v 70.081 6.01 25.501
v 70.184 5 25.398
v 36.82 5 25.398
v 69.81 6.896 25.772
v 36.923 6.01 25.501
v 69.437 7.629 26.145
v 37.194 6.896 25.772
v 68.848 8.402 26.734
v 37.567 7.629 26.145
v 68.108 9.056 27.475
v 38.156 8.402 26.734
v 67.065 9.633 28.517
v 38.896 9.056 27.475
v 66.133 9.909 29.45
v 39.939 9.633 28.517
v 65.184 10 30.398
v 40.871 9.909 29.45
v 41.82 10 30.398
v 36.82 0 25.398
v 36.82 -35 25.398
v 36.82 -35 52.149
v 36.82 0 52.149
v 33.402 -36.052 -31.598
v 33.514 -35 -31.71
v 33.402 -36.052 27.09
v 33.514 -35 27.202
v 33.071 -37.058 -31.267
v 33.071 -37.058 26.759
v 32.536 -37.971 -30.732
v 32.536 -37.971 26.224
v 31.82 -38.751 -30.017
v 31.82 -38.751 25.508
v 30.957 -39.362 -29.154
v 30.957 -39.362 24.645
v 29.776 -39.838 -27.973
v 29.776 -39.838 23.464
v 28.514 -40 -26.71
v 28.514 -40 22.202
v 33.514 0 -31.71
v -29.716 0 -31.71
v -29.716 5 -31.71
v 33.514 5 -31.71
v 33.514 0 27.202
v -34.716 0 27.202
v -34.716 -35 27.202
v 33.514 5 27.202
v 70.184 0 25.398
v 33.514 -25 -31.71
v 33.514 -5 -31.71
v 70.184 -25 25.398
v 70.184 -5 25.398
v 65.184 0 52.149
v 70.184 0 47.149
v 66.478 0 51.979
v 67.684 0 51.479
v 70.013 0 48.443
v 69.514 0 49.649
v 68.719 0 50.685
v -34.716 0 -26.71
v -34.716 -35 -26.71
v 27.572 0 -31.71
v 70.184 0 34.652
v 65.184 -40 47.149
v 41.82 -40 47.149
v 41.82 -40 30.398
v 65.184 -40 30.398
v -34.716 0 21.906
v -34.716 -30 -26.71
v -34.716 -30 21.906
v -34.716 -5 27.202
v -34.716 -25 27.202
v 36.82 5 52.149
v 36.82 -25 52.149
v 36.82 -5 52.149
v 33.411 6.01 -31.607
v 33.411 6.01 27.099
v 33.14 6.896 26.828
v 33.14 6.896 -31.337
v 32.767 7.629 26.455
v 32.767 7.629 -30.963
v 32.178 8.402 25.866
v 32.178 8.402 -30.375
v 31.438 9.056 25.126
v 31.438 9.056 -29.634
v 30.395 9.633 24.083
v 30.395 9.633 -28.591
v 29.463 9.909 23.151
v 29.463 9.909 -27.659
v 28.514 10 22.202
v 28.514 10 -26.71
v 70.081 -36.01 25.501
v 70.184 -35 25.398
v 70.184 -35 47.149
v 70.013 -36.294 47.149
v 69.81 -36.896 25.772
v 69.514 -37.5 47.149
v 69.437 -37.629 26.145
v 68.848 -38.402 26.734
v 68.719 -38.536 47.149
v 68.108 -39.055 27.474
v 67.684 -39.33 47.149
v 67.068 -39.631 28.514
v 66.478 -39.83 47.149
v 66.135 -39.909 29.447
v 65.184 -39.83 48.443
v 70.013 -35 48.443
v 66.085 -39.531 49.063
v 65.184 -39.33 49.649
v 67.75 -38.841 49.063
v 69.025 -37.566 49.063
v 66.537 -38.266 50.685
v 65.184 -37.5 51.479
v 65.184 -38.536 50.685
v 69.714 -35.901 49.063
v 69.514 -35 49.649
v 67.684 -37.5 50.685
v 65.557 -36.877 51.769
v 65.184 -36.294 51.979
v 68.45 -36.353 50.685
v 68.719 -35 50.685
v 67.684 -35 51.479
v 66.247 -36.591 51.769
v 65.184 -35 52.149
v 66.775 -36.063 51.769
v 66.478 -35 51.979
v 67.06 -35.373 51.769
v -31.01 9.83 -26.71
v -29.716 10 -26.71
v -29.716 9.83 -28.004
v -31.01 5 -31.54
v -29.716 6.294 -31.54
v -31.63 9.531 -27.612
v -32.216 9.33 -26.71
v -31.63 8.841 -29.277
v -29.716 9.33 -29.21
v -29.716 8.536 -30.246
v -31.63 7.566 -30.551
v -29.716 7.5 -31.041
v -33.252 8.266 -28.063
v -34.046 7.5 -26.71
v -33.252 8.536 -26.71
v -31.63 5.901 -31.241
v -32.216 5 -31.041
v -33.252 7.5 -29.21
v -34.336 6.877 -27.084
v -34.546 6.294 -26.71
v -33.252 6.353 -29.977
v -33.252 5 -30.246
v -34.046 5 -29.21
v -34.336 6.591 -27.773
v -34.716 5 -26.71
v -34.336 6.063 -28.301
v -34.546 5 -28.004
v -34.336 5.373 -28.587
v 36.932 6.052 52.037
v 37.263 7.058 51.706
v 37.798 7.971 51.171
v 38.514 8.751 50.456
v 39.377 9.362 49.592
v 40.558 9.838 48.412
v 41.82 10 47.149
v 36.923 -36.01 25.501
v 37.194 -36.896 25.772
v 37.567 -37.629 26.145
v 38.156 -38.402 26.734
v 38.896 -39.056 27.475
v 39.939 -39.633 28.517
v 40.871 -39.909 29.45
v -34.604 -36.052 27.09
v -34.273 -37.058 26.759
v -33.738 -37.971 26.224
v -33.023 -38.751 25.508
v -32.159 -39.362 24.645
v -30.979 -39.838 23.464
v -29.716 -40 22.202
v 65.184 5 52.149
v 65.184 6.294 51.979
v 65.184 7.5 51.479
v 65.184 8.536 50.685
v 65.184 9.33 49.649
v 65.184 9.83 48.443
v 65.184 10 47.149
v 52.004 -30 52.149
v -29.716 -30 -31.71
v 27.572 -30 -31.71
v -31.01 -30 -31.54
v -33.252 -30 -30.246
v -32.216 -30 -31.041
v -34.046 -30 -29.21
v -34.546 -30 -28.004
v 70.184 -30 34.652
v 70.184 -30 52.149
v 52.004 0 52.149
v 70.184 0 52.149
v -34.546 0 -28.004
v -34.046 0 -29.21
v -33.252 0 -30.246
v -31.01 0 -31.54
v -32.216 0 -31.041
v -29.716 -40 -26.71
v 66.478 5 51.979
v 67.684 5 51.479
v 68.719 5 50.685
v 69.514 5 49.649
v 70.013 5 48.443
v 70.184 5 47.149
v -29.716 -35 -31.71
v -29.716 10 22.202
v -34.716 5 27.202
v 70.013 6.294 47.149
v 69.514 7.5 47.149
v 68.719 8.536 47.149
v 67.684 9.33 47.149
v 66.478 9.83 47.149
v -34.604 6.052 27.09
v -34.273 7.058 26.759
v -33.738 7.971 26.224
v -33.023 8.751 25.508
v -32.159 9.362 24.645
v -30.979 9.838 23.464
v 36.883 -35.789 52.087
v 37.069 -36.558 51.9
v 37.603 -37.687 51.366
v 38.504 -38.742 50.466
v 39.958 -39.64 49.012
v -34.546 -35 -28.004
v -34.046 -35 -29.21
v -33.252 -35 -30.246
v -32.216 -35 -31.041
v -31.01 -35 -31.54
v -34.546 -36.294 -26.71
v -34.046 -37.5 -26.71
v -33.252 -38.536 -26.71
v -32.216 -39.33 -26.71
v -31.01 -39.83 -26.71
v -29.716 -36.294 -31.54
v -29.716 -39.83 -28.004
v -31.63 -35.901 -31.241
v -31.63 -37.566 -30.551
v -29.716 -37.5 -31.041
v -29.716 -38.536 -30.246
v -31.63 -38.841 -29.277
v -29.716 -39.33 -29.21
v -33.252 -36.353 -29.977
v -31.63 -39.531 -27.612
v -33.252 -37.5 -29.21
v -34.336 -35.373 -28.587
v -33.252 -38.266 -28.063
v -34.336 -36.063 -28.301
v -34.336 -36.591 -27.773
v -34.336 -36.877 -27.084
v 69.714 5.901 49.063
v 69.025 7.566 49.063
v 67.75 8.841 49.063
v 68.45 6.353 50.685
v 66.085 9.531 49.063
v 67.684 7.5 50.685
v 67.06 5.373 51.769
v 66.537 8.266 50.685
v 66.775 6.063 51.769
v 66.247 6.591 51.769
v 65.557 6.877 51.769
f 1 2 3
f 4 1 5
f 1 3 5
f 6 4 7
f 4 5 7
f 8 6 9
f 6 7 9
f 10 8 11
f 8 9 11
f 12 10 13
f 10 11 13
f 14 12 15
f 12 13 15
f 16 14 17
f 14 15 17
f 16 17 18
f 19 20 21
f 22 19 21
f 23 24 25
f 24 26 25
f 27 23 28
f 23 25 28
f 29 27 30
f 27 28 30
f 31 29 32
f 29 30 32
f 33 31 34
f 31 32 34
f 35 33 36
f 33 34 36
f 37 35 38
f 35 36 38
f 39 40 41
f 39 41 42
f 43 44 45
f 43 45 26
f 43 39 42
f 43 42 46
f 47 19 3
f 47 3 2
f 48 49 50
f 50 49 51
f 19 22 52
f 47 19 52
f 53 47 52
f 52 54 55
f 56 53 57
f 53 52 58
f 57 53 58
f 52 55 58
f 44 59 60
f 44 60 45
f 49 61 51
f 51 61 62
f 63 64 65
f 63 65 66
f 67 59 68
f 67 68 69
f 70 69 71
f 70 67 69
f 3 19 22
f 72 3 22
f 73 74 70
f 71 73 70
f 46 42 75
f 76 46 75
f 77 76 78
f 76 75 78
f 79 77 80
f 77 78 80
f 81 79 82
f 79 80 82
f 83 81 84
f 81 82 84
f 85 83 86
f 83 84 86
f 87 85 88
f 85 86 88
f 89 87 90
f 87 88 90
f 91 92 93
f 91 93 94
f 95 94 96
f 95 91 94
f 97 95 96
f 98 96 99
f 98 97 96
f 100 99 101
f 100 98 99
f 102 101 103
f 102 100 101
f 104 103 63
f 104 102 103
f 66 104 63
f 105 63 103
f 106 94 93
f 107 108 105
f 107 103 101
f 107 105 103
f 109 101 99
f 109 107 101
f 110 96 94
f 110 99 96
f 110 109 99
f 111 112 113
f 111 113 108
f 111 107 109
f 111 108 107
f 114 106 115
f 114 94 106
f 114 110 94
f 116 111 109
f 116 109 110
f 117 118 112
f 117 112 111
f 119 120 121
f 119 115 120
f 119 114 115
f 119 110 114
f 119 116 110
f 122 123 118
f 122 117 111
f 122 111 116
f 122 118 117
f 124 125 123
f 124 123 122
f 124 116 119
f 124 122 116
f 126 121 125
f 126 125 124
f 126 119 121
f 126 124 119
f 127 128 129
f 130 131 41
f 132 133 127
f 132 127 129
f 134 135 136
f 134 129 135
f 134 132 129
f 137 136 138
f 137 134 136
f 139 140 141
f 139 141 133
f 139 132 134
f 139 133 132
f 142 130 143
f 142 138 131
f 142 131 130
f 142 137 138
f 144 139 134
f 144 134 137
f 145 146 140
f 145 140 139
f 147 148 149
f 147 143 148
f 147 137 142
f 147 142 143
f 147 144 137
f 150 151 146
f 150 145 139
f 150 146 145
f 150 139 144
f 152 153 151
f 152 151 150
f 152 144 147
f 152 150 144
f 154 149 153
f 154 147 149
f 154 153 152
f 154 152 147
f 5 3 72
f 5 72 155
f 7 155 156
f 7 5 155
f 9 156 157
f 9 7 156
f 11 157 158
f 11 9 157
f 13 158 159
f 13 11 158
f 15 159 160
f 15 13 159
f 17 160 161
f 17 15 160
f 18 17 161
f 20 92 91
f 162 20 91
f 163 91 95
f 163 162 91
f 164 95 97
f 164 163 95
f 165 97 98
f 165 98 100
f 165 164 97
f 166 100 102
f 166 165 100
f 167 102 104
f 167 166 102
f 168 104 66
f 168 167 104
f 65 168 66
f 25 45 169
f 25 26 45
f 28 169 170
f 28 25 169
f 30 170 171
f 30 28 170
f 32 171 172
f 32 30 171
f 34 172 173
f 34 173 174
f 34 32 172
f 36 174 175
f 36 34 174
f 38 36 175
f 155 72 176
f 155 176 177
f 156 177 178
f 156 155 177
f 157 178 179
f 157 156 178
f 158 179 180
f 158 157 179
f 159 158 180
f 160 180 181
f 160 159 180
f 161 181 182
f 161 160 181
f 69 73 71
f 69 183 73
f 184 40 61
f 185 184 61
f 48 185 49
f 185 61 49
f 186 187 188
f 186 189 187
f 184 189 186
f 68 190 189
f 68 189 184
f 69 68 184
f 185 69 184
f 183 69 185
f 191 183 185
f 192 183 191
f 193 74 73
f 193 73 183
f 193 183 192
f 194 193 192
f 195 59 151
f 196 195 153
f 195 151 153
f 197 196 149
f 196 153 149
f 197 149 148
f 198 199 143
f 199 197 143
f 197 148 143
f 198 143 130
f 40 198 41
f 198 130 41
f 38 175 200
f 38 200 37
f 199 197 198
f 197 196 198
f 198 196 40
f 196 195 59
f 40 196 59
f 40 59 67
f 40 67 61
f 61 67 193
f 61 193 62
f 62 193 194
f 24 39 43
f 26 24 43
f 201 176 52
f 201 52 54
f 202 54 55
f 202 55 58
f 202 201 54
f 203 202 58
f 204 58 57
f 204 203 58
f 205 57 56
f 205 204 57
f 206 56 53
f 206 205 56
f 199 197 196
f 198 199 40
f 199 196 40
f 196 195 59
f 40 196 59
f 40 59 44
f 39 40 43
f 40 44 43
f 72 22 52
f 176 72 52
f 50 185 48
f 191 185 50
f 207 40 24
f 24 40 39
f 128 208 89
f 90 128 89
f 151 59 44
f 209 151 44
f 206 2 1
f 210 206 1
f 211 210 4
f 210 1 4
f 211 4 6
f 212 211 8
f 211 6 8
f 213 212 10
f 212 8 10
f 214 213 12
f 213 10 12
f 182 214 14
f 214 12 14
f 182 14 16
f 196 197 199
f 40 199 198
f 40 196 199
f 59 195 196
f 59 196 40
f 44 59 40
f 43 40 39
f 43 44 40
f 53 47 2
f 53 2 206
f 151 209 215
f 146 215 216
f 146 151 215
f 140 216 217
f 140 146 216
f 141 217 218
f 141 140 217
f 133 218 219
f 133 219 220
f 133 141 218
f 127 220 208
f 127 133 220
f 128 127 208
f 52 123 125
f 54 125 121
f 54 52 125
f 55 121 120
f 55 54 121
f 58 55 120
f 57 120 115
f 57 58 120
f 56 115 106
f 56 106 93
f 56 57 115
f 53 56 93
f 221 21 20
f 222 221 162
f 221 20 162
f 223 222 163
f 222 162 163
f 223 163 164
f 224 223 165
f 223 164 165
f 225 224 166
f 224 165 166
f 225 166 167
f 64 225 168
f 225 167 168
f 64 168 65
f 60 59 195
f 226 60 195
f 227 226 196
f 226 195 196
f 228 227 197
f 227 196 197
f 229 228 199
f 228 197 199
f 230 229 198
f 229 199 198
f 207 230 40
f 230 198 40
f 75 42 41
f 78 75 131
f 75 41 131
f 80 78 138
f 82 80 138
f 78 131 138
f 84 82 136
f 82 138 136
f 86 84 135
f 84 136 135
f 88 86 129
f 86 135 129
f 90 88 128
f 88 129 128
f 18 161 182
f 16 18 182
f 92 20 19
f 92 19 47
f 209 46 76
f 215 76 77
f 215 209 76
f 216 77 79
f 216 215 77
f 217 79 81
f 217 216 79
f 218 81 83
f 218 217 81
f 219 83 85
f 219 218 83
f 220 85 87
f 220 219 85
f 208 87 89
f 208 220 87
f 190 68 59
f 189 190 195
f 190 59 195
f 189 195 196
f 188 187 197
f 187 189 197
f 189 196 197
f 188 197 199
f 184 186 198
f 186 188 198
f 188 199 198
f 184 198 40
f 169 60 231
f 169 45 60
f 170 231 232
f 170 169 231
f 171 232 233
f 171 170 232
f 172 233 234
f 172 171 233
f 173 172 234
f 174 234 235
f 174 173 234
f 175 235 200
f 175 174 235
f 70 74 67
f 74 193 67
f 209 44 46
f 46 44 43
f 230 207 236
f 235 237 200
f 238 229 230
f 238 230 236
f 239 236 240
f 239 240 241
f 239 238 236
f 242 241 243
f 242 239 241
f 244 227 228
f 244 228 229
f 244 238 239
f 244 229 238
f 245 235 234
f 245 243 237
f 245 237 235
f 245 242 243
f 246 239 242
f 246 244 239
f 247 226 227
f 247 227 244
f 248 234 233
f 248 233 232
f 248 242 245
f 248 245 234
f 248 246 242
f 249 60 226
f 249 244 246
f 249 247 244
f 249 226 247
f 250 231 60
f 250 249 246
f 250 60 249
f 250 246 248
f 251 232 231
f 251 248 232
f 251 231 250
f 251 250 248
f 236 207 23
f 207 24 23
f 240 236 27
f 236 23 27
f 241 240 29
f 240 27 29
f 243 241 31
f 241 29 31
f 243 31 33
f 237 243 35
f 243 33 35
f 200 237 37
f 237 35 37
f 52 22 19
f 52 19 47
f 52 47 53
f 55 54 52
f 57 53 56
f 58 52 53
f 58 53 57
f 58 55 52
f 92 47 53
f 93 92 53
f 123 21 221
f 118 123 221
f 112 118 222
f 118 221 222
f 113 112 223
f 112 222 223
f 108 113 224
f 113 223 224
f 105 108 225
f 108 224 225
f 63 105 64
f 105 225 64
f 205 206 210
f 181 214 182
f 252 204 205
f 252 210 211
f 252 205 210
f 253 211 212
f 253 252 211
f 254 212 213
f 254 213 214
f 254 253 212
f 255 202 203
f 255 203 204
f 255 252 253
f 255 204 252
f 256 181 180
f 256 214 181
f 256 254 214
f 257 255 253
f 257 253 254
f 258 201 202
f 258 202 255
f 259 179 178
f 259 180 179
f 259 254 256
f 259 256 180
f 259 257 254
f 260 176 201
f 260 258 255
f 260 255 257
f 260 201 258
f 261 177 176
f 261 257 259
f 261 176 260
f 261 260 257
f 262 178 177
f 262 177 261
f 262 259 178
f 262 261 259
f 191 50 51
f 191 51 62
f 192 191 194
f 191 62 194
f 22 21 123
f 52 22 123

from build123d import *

# Parameters (mm, degrees)
F0_W           = 68.229958415
F0_H           = 58.9122157544
F1_DEPTH       = 40
F0_W_2         = 33.3635509014
F0_H_2         = 26.750953868
F2_DEPTH       = 30
F3_R           = 5
F4_SIZE        = 5
F5_DEPTH       = 10
F6_T1_DEPTH    = 47.5
F6_S5_W        = 5
F6_S5_H        = 5
F6_T6_DEPTH    = 5
F6_2_T1_DEPTH  = 51.750953868
F6_2_T3_DEPTH  = 34.250953868
F6_2_T5_DEPTH  = 58.3635509014
F6_2_T7_DEPTH  = 40.8635509014
F6_2_T9_DEPTH  = 47.5
F6_2_S13_W     = 5
F6_2_S13_H     = 5
F6_2_T14_DEPTH = 5
F6_3_T1_DEPTH  = 55
F6_4_T1_DEPTH  = 93.229958415
F6_4_T3_DEPTH  = 83.9122157544
F6_4_T5_DEPTH  = 66.4122157544
F6_4_T7_DEPTH  = 75.729958415
F6_4_T9_DEPTH  = 17.5
F6_4_S13_W     = 5
F6_4_S13_H     = 5
F6_4_T14_DEPTH = 5
F6_5_T1_DEPTH  = 40.8635509014
F6_5_T3_DEPTH  = 34.250953868
F6_5_T5_DEPTH  = 58.3635509014
F6_5_T7_DEPTH  = 51.750953868
F6_5_T9_DEPTH  = 17.5
F6_5_S13_W     = 5
F6_5_S13_H     = 5
F6_5_T14_DEPTH = 5


# Not quite as in the source:
# - a fillet or chamfer that OpenCascade refuses, or shapes differently, is made with other operations: its cross-section is extruded or revolved along the edge and cut away or added


with BuildPart() as f1:
    # F0 (on Front) → F1 (new body)
    with BuildSketch(Plane.XZ):
        with Locations((-0.6011463702, -2.2542933002)):
            Rectangle(F0_W, F0_H)
    extrude(amount=F1_DEPTH)

    # F3
    f3_edges = [f1.edges().sort_by_distance(p)[0] for p in [
        (-0.601146, -40, 27.201815),
        (-34.716126, -40, -2.254293),
        (-0.601146, -40, -31.710401),
        (33.513833, -40, -2.254293),
    ]]
    fillet(f3_edges, radius=F3_R)


with BuildPart() as f1b:
    # F0 (on Front) → F1, piece 2 (new body)
    with BuildSketch(Plane.XZ):
        with Locations((53.5019114614, 38.7738561258)):
            Rectangle(F0_W_2, F0_H_2)
    extrude(amount=F1_DEPTH)


with BuildPart() as f2:
    # F0 (on Front) → F2 (new body)
    with BuildSketch(Plane.XZ):
        Polygon((36.8201360106, 52.1493330598), (-34.7161255777, 27.201814577), (33.5138328373, 27.201814577), (33.5138328373, -31.7104011774), (70.1836869121, 25.3983791918), (36.8201360106, 25.3983791918), align=None)
        with Locations((-0.6011463702, -2.2542933002)):
            Rectangle(F0_W, F0_H)
        with Locations((53.5019114614, 38.7738561258)):
            Rectangle(F0_W_2, F0_H_2)
    extrude(amount=F2_DEPTH)

    # F4
    f4_edges = [f2.edges().sort_by_distance(p)[0] for p in [
        (1.052005, -30, 39.675574),
        (1.052005, 0, 39.675574),
        (51.84876, -30, -3.156011),
        (51.84876, 0, -3.156011),
    ]]
    chamfer(f4_edges, length=F4_SIZE)

    # F6#3: fillet of radius 5 on 1 edges, made by hand

    # F6_3_s2 → F6_3_t1 (cut)
    with BuildSketch(Plane.XZ.offset(-12.5)):
        with BuildLine():
            ThreePointArc((-34.7161255777, -26.7104011774), (-33.2516594836, -30.2459350833), (-29.7161255777, -31.7104011774))
            Line((-29.7161255777, -31.7104011774), (-34.7161255777, -31.7104011774))
            Line((-34.7161255777, -31.7104011774), (-34.7161255777, -26.7104011774))
        make_face()
    extrude(amount=F6_3_T1_DEPTH, mode=Mode.SUBTRACT)


with BuildPart() as f5:
    # F5 (new): a face of the model
    f5_faces = [f1.part.faces().sort_by_distance(p)[0] for p in [
        (-0.6011463702, 0, -2.2542933002),
    ]]
    extrude(f5_faces, amount=F5_DEPTH)

    # F6#4: fillet of radius 5 on 5 edges, made by hand

    # F6_4_s2 → F6_4_t1 (cut)
    with BuildSketch(Plane.YZ.offset(-47.2161255777)):
        with BuildLine():
            ThreePointArc((5, 27.201814577), (8.5355339059, 25.7373484829), (10, 22.201814577))
            Line((10, 22.201814577), (10, 27.201814577))
            Line((10, 27.201814577), (5, 27.201814577))
        make_face()
    extrude(amount=F6_4_T1_DEPTH, mode=Mode.SUBTRACT)

    # F6_4_s4 → F6_4_t3 (cut)
    with BuildSketch(Plane.XY.offset(-44.2104011774)):
        with BuildLine():
            ThreePointArc((33.5138328373, 5), (32.0493667433, 8.5355339059), (28.5138328373, 10))
            Line((28.5138328373, 10), (33.5138328373, 10))
            Line((33.5138328373, 10), (33.5138328373, 5))
        make_face()
    extrude(amount=F6_4_T3_DEPTH, mode=Mode.SUBTRACT)

    # F6_4_s6 → F6_4_t5 (cut)
    with BuildSketch(Plane.XY.offset(-26.7104011774)):
        with BuildLine():
            ThreePointArc((-34.7161255777, 5), (-33.2516594836, 8.5355339059), (-29.7161255777, 10))
            Line((-29.7161255777, 10), (-34.7161255777, 10))
            Line((-34.7161255777, 10), (-34.7161255777, 5))
        make_face()
    extrude(amount=F6_4_T5_DEPTH, mode=Mode.SUBTRACT)

    # F6_4_s8 → F6_4_t7 (cut)
    with BuildSketch(Plane.YZ.offset(-29.7161255777)):
        with BuildLine():
            ThreePointArc((5, -31.7104011774), (8.5355339059, -30.2459350833), (10, -26.7104011774))
            Line((10, -26.7104011774), (10, -31.7104011774))
            Line((10, -31.7104011774), (5, -31.7104011774))
        make_face()
    extrude(amount=F6_4_T7_DEPTH, mode=Mode.SUBTRACT)

    # F6_4_s10 → F6_4_t9 (cut)
    with BuildSketch(Plane.XZ.offset(-5)):
        with BuildLine():
            ThreePointArc((-34.7161255777, -26.7104011774), (-33.2516594836, -30.2459350833), (-29.7161255777, -31.7104011774))
            Line((-29.7161255777, -31.7104011774), (-34.7161255777, -31.7104011774))
            Line((-34.7161255777, -31.7104011774), (-34.7161255777, -26.7104011774))
        make_face()
    extrude(amount=F6_4_T9_DEPTH, mode=Mode.SUBTRACT)


with BuildPart() as f5b:
    # F5#2 (new): a face of the model
    f5_2_faces = [f1b.part.faces().sort_by_distance(p)[0] for p in [
        (53.5019114614, 0, 38.7738561258),
    ]]
    extrude(f5_2_faces, amount=F5_DEPTH)

    # F6#5: fillet of radius 5 on 5 edges, made by hand

    # F6_5_s2 → F6_5_t1 (cut)
    with BuildSketch(Plane.YZ.offset(24.3201360106)):
        with BuildLine():
            ThreePointArc((5, 52.1493330598), (8.5355339059, 50.6848669657), (10, 47.1493330598))
            Line((10, 47.1493330598), (10, 52.1493330598))
            Line((10, 52.1493330598), (5, 52.1493330598))
        make_face()
    extrude(amount=F6_5_T1_DEPTH, mode=Mode.SUBTRACT)

    # F6_5_s4 → F6_5_t3 (cut)
    with BuildSketch(Plane.XY.offset(12.8983791918)):
        with BuildLine():
            ThreePointArc((70.1836869121, 5), (68.719220818, 8.5355339059), (65.1836869121, 10))
            Line((65.1836869121, 10), (70.1836869121, 10))
            Line((70.1836869121, 10), (70.1836869121, 5))
        make_face()
    extrude(amount=F6_5_T3_DEPTH, mode=Mode.SUBTRACT)

    # F6_5_s6 → F6_5_t5 (cut)
    with BuildSketch(Plane.YZ.offset(24.3201360106)):
        with BuildLine():
            ThreePointArc((5, 25.3983791918), (8.5355339059, 26.8628452858), (10, 30.3983791918))
            Line((10, 30.3983791918), (10, 25.3983791918))
            Line((10, 25.3983791918), (5, 25.3983791918))
        make_face()
    extrude(amount=F6_5_T5_DEPTH, mode=Mode.SUBTRACT)

    # F6_5_s8 → F6_5_t7 (cut)
    with BuildSketch(Plane.XY.offset(12.8983791918)):
        with BuildLine():
            ThreePointArc((36.8201360106, 5), (38.2846021047, 8.5355339059), (41.8201360106, 10))
            Line((41.8201360106, 10), (36.8201360106, 10))
            Line((36.8201360106, 10), (36.8201360106, 5))
        make_face()
    extrude(amount=F6_5_T7_DEPTH, mode=Mode.SUBTRACT)

    # F6_5_s10 → F6_5_t9 (cut)
    with BuildSketch(Plane.XZ.offset(-5)):
        with BuildLine():
            ThreePointArc((65.1836869121, 52.1493330598), (68.719220818, 50.6848669657), (70.1836869121, 47.1493330598))
            Line((70.1836869121, 47.1493330598), (70.1836869121, 52.1493330598))
            Line((70.1836869121, 52.1493330598), (65.1836869121, 52.1493330598))
        make_face()
    extrude(amount=F6_5_T9_DEPTH, mode=Mode.SUBTRACT)


with BuildPart() as f1_1:
    add(f1.part)

    # F6: fillet of radius 5 on 1 edges, made by hand

    # F6_s2 → F6_t1 (cut)
    with BuildSketch(Plane.XZ.offset(-12.5)):
        with BuildLine():
            ThreePointArc((-34.7161255777, -26.7104011774), (-33.2516594836, -30.2459350833), (-29.7161255777, -31.7104011774))
            Line((-29.7161255777, -31.7104011774), (-34.7161255777, -31.7104011774))
            Line((-34.7161255777, -31.7104011774), (-34.7161255777, -26.7104011774))
        make_face()
    extrude(amount=F6_T1_DEPTH, mode=Mode.SUBTRACT)


with BuildPart() as f6_tool4:
    # F6_s5 → F6_t6 (new body)
    with BuildSketch(Plane.YZ.offset(-29.7161255777)):
        with Locations((-37.5, -29.2104011774)):
            Rectangle(F6_S5_W, F6_S5_H)
    extrude(amount=-F6_T6_DEPTH)

    # F6_s7 → F6_t8 (revolve, cut)
    with BuildSketch(Plane(origin=(-29.7161255777, -35, -26.7104011774), x_dir=(0, 0.7071067812, 0.7071067812), z_dir=(0, -0.7071067812, 0.7071067812))):
        with BuildLine():
            ThreePointArc((0, -5), (5, 0), (0, 5))
            Line((0, 5), (0, -5))
        make_face()
    revolve(axis=Axis((-29.7161255777, -35, -26.7104011774), (-1, 0, 0)), mode=Mode.SUBTRACT)


with BuildPart() as f1_2:
    add(f1_1.part)

    # F6_t3: cut F6_tool4
    add(f6_tool4.part, mode=Mode.SUBTRACT)


with BuildPart() as f1b_1:
    add(f1b.part)

    # F6#2: fillet of radius 5 on 5 edges, made by hand

    # F6_2_s2 → F6_2_t1 (cut)
    with BuildSketch(Plane.XY.offset(12.8983791918)):
        with BuildLine():
            ThreePointArc((36.8201360106, -35), (38.2846021047, -38.5355339059), (41.8201360106, -40))
            Line((41.8201360106, -40), (36.8201360106, -40))
            Line((36.8201360106, -40), (36.8201360106, -35))
        make_face()
    extrude(amount=F6_2_T1_DEPTH, mode=Mode.SUBTRACT)

    # F6_2_s4 → F6_2_t3 (cut)
    with BuildSketch(Plane.XY.offset(12.8983791918)):
        with BuildLine():
            ThreePointArc((70.1836869121, -35), (68.719220818, -38.5355339059), (65.1836869121, -40))
            Line((65.1836869121, -40), (70.1836869121, -40))
            Line((70.1836869121, -40), (70.1836869121, -35))
        make_face()
    extrude(amount=F6_2_T3_DEPTH, mode=Mode.SUBTRACT)

    # F6_2_s6 → F6_2_t5 (cut)
    with BuildSketch(Plane.YZ.offset(24.3201360106)):
        with BuildLine():
            ThreePointArc((-35, 25.3983791918), (-38.5355339059, 26.8628452858), (-40, 30.3983791918))
            Line((-40, 30.3983791918), (-40, 25.3983791918))
            Line((-40, 25.3983791918), (-35, 25.3983791918))
        make_face()
    extrude(amount=F6_2_T5_DEPTH, mode=Mode.SUBTRACT)

    # F6_2_s8 → F6_2_t7 (cut)
    with BuildSketch(Plane.YZ.offset(24.3201360106)):
        with BuildLine():
            ThreePointArc((-35, 52.1493330598), (-38.5355339059, 50.6848669657), (-40, 47.1493330598))
            Line((-40, 47.1493330598), (-40, 52.1493330598))
            Line((-40, 52.1493330598), (-35, 52.1493330598))
        make_face()
    extrude(amount=F6_2_T7_DEPTH, mode=Mode.SUBTRACT)

    # F6_2_s10 → F6_2_t9 (cut)
    with BuildSketch(Plane.XZ.offset(-12.5)):
        with BuildLine():
            ThreePointArc((65.1836869121, 52.1493330598), (68.719220818, 50.6848669657), (70.1836869121, 47.1493330598))
            Line((70.1836869121, 47.1493330598), (70.1836869121, 52.1493330598))
            Line((70.1836869121, 52.1493330598), (65.1836869121, 52.1493330598))
        make_face()
    extrude(amount=F6_2_T9_DEPTH, mode=Mode.SUBTRACT)


with BuildPart() as f6_2_tool12:
    # F6_2_s13 → F6_2_t14 (new body)
    with BuildSketch(Plane.XY.offset(47.1493330598)):
        with Locations((67.6836869121, -37.5)):
            Rectangle(F6_2_S13_W, F6_2_S13_H)
    extrude(amount=F6_2_T14_DEPTH)

    # F6_2_s15 → F6_2_t16 (revolve, cut)
    with BuildSketch(Plane(origin=(65.1836869121, -35, 47.1493330598), x_dir=(-0.7071067812, 0.7071067812, 0), z_dir=(0.7071067812, 0.7071067812, 0))):
        with BuildLine():
            ThreePointArc((0, -5), (5, 0), (0, 5))
            Line((0, 5), (0, -5))
        make_face()
    revolve(axis=Axis((65.1836869121, -35, 47.1493330598), (0, 0, 1)), mode=Mode.SUBTRACT)


with BuildPart() as f1b_2:
    add(f1b_1.part)

    # F6_2_t11: cut F6_2_tool12
    add(f6_2_tool12.part, mode=Mode.SUBTRACT)


with BuildPart() as f6_4_tool12:
    # F6_4_s13 → F6_4_t14 (new body)
    with BuildSketch(Plane.YZ.offset(-29.7161255777)):
        with Locations((7.5, -29.2104011774)):
            Rectangle(F6_4_S13_W, F6_4_S13_H)
    extrude(amount=-F6_4_T14_DEPTH)

    # F6_4_s15 → F6_4_t16 (revolve, cut)
    with BuildSketch(Plane(origin=(-29.7161255777, 5, -26.7104011774), x_dir=(0, -0.7071067812, 0.7071067812), z_dir=(0, -0.7071067812, -0.7071067812))):
        with BuildLine():
            ThreePointArc((0, -5), (5, 0), (0, 5))
            Line((0, 5), (0, -5))
        make_face()
    revolve(axis=Axis((-29.7161255777, 5, -26.7104011774), (-1, 0, 0)), mode=Mode.SUBTRACT)


with BuildPart() as f5_1:
    add(f5.part)

    # F6_4_t11: cut F6_4_tool12
    add(f6_4_tool12.part, mode=Mode.SUBTRACT)


with BuildPart() as f6_5_tool12:
    # F6_5_s13 → F6_5_t14 (new body)
    with BuildSketch(Plane.XY.offset(47.1493330598)):
        with Locations((67.6836869121, 7.5)):
            Rectangle(F6_5_S13_W, F6_5_S13_H)
    extrude(amount=F6_5_T14_DEPTH)

    # F6_5_s15 → F6_5_t16 (revolve, cut)
    with BuildSketch(Plane(origin=(65.1836869121, 5, 47.1493330598), x_dir=(-0.7071067812, -0.7071067812, 0), z_dir=(-0.7071067812, 0.7071067812, 0))):
        with BuildLine():
            ThreePointArc((0, -5), (5, 0), (0, 5))
            Line((0, 5), (0, -5))
        make_face()
    revolve(axis=Axis((65.1836869121, 5, 47.1493330598), (0, 0, 1)), mode=Mode.SUBTRACT)


with BuildPart() as f5b_1:
    add(f5b.part)

    # F6_5_t11: cut F6_5_tool12
    add(f6_5_tool12.part, mode=Mode.SUBTRACT)


solid = Compound([f2.part, f1_2.part, f1b_2.part, f5_1.part, f5b_1.part])
